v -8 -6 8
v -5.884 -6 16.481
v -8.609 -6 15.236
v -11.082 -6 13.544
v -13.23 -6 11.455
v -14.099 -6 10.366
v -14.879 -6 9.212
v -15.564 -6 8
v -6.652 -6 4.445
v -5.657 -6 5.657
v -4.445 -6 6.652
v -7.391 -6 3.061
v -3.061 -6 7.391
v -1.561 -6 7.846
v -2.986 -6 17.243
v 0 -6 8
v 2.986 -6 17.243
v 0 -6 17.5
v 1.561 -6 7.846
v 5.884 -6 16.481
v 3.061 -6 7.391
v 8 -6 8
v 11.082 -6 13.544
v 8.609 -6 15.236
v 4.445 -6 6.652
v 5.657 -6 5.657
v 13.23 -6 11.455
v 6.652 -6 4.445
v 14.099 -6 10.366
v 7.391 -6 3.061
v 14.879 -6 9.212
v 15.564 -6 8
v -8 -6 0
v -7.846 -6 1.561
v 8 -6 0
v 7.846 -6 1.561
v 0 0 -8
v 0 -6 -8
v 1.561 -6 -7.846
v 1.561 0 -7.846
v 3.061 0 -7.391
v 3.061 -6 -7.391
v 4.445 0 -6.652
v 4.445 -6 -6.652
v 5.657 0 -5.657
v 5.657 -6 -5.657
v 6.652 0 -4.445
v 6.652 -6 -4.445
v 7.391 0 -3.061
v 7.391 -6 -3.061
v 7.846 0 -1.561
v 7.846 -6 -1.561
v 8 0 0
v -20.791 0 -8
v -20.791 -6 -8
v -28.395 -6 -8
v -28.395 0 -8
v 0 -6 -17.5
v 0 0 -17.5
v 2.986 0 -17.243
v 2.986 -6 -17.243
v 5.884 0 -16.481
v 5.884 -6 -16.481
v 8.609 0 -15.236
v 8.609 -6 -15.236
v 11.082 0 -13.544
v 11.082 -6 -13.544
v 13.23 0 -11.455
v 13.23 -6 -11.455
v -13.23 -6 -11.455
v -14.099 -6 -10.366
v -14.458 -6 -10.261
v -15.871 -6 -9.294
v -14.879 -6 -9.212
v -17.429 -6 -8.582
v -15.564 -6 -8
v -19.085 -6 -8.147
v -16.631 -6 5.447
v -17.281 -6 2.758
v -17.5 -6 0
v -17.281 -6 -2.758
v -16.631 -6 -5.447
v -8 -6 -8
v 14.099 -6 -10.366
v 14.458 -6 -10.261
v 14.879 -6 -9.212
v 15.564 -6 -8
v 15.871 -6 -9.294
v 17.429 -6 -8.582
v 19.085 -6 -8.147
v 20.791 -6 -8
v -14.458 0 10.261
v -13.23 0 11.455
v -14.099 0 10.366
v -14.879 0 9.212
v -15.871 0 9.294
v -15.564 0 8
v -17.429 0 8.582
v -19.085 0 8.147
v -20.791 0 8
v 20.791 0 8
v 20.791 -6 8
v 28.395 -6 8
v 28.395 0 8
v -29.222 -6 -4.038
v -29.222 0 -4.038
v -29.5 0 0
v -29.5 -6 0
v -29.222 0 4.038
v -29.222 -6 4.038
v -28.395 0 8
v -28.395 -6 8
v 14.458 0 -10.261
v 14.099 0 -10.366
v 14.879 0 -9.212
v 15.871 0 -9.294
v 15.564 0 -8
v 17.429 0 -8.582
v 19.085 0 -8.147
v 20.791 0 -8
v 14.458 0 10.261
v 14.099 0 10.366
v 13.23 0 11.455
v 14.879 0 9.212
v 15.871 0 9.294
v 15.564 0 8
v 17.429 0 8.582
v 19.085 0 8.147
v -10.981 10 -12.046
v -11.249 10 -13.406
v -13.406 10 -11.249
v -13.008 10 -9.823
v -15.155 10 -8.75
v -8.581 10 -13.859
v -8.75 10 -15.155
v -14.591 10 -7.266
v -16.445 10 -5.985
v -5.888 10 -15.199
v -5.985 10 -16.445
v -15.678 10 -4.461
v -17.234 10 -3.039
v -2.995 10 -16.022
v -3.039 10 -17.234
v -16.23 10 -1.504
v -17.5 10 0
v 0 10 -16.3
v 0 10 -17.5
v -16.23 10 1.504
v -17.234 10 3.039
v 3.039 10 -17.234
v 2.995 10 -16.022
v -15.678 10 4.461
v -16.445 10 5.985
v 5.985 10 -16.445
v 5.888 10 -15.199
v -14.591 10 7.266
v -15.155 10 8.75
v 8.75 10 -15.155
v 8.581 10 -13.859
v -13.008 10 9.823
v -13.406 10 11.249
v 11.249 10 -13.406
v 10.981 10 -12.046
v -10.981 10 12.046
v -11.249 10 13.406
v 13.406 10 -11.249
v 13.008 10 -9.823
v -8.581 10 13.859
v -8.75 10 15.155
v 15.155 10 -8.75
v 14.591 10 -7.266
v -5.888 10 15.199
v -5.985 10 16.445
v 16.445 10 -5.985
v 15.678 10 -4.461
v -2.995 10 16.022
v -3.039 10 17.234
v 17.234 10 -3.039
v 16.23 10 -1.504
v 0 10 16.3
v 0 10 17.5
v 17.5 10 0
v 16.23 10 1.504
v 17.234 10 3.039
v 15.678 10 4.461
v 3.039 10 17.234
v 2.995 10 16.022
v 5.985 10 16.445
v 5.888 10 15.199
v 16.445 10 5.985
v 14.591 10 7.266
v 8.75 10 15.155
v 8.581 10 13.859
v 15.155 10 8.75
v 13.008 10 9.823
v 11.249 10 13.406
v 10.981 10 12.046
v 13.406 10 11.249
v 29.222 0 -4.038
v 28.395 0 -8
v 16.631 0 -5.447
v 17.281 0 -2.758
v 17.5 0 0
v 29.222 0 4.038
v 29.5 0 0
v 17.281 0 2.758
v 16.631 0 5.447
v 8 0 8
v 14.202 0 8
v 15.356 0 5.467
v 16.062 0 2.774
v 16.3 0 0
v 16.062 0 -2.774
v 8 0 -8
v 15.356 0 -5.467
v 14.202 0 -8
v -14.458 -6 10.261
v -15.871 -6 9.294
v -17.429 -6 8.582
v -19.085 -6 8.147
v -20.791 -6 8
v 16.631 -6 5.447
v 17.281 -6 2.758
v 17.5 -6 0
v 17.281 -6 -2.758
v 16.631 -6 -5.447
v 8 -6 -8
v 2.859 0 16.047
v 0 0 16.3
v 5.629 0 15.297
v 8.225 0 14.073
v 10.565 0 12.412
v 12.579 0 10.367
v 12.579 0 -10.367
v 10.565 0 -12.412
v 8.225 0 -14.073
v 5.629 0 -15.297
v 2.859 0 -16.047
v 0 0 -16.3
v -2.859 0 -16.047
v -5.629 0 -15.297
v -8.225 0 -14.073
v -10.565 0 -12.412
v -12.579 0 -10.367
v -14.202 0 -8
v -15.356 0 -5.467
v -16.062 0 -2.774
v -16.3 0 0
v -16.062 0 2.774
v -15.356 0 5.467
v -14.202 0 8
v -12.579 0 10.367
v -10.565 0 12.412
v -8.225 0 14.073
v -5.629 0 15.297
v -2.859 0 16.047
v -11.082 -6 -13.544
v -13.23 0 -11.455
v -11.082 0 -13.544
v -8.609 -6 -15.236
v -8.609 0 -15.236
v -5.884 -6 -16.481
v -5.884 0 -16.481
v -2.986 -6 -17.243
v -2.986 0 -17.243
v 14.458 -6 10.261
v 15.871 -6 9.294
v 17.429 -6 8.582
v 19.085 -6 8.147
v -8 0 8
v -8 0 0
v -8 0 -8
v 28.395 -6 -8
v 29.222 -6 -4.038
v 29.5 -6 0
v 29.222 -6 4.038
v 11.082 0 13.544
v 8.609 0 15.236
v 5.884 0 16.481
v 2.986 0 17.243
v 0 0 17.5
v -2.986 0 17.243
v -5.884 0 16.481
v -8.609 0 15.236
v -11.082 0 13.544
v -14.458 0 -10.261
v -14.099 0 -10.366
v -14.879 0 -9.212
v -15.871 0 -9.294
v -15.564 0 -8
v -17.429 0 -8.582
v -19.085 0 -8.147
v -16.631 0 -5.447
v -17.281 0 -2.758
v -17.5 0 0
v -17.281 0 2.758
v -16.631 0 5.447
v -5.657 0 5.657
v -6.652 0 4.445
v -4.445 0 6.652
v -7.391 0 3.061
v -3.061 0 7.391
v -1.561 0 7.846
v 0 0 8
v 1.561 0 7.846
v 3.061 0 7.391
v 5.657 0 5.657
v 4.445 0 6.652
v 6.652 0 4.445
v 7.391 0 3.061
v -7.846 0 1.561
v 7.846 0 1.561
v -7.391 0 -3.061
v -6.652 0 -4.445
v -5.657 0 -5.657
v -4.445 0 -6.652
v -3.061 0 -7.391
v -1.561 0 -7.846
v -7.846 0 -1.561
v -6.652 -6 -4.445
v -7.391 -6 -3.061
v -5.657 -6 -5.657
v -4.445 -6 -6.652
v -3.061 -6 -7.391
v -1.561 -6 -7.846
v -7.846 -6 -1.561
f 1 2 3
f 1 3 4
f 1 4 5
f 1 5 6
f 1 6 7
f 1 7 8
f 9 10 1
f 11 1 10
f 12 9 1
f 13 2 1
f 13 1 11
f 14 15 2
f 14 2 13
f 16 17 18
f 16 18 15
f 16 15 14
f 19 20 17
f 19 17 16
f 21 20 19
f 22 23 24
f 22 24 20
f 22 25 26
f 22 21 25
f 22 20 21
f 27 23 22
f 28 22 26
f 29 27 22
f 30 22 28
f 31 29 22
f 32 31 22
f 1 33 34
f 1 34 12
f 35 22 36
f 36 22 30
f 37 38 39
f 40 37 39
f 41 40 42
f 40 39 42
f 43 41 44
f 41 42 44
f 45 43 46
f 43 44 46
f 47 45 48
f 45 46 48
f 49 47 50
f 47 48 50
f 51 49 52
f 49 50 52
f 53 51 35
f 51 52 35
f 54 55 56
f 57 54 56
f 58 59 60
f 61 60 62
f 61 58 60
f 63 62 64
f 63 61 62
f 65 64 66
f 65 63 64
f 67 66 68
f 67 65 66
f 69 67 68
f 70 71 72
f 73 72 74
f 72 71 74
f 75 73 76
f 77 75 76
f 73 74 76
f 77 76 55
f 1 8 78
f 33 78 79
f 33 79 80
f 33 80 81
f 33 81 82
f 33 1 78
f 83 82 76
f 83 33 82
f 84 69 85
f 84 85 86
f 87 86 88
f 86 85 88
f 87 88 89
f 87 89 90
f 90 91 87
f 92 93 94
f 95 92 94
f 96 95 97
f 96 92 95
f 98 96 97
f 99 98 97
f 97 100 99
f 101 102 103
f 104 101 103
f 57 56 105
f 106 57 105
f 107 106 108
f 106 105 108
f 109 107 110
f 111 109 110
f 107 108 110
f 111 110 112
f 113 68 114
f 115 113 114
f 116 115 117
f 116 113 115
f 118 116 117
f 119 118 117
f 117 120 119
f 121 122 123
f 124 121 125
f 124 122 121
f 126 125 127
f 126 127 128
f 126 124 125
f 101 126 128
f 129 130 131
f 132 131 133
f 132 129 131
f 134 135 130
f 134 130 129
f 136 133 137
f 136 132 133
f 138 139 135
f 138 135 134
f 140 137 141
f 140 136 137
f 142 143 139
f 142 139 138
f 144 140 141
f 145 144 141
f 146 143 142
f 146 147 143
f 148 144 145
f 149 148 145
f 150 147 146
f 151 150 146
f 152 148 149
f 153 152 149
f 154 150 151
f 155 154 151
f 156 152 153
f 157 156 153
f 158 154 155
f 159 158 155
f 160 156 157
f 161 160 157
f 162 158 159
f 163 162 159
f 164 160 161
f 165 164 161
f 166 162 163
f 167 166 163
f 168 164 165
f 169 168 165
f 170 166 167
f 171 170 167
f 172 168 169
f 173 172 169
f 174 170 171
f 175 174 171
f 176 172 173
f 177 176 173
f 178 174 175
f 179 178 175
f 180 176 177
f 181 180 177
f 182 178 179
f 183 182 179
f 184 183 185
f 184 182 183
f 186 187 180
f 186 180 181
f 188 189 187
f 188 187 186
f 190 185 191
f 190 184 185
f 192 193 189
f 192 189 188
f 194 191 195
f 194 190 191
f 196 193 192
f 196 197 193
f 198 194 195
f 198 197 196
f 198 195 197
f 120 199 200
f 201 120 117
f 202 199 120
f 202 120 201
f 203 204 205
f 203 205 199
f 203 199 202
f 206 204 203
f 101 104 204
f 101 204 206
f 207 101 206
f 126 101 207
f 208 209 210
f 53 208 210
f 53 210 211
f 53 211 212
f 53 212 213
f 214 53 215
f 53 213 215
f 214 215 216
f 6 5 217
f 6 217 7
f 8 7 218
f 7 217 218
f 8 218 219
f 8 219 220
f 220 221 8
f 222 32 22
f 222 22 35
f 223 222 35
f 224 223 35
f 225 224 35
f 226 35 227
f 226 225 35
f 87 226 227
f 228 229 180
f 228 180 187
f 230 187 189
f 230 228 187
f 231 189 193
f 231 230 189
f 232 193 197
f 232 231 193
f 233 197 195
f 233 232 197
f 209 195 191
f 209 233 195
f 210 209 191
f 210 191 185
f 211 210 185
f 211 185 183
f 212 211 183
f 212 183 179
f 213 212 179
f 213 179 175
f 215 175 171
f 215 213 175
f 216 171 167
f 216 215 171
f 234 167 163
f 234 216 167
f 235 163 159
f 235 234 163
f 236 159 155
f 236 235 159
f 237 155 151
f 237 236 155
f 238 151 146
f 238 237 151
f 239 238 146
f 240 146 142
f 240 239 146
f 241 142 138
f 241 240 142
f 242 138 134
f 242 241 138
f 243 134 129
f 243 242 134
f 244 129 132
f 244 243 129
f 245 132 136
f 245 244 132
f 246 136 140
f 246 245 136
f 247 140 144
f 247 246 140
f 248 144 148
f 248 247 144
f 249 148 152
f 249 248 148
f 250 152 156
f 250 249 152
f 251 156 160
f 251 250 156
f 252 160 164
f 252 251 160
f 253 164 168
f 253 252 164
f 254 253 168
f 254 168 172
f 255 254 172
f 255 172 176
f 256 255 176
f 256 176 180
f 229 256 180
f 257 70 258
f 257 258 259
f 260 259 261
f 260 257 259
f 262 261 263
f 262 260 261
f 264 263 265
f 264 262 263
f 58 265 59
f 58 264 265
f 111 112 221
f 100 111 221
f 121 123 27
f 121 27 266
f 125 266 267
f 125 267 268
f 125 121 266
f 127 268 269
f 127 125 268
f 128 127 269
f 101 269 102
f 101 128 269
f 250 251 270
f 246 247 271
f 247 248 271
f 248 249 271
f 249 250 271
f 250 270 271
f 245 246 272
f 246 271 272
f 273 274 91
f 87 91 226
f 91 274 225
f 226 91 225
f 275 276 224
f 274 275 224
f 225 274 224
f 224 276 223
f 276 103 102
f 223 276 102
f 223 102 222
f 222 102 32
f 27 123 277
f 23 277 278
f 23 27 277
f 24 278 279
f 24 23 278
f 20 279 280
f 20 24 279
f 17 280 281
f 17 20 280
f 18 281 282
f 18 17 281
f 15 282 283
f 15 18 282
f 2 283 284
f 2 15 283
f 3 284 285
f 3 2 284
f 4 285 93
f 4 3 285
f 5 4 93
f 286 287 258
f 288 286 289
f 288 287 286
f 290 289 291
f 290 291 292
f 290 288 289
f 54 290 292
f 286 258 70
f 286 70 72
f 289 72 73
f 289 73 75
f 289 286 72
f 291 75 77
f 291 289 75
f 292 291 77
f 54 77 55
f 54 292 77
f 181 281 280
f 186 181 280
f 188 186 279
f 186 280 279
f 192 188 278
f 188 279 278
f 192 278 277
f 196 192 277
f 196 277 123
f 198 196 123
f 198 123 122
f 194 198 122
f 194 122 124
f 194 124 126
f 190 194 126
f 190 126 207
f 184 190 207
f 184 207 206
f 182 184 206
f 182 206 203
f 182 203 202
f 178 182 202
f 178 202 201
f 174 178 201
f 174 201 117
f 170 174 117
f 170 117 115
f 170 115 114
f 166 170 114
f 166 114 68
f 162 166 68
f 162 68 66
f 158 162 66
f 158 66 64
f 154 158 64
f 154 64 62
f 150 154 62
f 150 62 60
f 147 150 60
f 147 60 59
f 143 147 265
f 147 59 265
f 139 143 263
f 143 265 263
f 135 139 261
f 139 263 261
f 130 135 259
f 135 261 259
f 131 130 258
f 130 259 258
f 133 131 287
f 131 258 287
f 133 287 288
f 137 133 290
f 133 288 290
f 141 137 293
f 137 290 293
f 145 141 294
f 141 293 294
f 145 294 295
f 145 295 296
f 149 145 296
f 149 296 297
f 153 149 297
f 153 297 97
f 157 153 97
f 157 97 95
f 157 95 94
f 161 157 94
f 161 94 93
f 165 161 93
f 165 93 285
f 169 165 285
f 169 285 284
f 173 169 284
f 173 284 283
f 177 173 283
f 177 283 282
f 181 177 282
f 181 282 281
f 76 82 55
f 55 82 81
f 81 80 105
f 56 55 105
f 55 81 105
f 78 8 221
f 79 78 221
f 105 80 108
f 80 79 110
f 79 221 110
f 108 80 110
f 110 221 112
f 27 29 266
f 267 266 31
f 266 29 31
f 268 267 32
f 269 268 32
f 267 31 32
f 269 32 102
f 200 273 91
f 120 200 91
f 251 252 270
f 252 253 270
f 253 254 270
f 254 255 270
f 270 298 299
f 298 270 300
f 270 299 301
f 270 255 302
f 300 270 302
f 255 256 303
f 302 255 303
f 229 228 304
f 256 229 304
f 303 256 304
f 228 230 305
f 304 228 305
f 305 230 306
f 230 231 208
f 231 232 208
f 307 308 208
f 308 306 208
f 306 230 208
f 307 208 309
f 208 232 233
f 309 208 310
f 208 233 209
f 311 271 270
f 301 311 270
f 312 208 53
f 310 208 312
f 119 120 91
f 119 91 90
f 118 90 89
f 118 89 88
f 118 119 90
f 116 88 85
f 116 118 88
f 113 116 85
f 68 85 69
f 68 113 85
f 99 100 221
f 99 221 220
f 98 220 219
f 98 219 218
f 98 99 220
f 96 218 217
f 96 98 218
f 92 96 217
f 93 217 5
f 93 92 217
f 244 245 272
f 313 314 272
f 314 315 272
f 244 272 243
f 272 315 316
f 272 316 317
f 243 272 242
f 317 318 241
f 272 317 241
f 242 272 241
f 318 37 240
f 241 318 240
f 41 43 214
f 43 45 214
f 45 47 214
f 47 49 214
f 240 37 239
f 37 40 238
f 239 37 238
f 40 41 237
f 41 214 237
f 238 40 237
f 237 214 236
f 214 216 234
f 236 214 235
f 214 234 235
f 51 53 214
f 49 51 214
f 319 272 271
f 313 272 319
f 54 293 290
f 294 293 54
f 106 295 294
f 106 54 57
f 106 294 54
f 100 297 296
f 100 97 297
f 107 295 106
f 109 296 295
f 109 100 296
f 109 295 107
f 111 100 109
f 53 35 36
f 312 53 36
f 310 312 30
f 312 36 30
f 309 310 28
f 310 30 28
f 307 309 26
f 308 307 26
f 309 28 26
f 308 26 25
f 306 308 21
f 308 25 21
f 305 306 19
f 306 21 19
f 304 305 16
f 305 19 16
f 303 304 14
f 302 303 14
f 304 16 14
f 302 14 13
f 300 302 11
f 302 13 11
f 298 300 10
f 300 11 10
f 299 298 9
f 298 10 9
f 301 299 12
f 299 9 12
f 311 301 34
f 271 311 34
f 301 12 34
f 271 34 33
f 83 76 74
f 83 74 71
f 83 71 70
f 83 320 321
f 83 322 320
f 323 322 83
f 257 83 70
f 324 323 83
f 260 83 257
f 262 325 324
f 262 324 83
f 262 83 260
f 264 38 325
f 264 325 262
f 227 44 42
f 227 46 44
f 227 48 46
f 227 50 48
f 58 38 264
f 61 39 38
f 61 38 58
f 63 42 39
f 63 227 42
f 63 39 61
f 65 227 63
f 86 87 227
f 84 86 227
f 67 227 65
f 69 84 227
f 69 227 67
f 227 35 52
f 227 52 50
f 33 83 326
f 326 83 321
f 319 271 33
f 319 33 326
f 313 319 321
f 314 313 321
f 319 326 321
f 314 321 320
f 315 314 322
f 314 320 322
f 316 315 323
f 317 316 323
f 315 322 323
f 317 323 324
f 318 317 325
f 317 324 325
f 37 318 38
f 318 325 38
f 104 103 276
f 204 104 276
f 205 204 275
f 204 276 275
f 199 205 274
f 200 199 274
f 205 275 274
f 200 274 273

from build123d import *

# Parameters (mm, degrees)
SKETCH1_R           = 17.5
SKETCH1_R_2         = 16.3
BOSS_EXTRUDE1_DEPTH = 10
BOSS_EXTRUDE2_START = 6
SKETCH2_R           = 17.5
SKETCH2_R_2         = 8
BOSS_EXTRUDE2_DEPTH = 6
BOSS_EXTRUDE3_DEPTH = 6
FILLET1_R           = 10


with BuildPart() as part:
    # Sketch1 → Boss-Extrude1 (new body)
    with BuildSketch(Plane(origin=(0, 0, 0), x_dir=(1, 0, 0), z_dir=(0, 1, 0))):
        Circle(SKETCH1_R)
        Circle(SKETCH1_R_2, mode=Mode.SUBTRACT)
    extrude(amount=BOSS_EXTRUDE1_DEPTH)

    # Sketch2 → Boss-Extrude2 (add)
    with BuildSketch(Plane.XZ.offset(BOSS_EXTRUDE2_START)):
        Circle(SKETCH2_R)
        Circle(SKETCH2_R_2, mode=Mode.SUBTRACT)
    extrude(amount=-BOSS_EXTRUDE2_DEPTH)

    # Sketch4 → Boss-Extrude3 (add)
    with BuildSketch(Plane.XZ.offset(6)):
        with BuildLine():
            Line((-28.394541729, 8), (-8, 8))
            Line((-8, 8), (-8, -8))
            Line((-8, -8), (-28.394541729, -8))
            ThreePointArc((-28.394541729, -8), (-29.5, 0), (-28.394541729, 8))
        make_face()
        with BuildLine():
            Line((28.394541729, -8), (8, -8))
            Line((8, -8), (8, 8))
            Line((8, 8), (28.394541729, 8))
            ThreePointArc((28.394541729, 8), (29.5, 0), (28.394541729, -8))
        make_face()
    extrude(amount=-BOSS_EXTRUDE3_DEPTH)

    # Fillet1
    fillet1_edges = [part.edges().sort_by_distance(p)[0] for p in [
        (15.564382416, -3, -8),
        (15.564382416, -3, 8),
        (-15.564382416, -3, -8),
        (-15.564382416, -3, 8),
    ]]
    fillet(fillet1_edges, radius=FILLET1_R)


solid = part.part
